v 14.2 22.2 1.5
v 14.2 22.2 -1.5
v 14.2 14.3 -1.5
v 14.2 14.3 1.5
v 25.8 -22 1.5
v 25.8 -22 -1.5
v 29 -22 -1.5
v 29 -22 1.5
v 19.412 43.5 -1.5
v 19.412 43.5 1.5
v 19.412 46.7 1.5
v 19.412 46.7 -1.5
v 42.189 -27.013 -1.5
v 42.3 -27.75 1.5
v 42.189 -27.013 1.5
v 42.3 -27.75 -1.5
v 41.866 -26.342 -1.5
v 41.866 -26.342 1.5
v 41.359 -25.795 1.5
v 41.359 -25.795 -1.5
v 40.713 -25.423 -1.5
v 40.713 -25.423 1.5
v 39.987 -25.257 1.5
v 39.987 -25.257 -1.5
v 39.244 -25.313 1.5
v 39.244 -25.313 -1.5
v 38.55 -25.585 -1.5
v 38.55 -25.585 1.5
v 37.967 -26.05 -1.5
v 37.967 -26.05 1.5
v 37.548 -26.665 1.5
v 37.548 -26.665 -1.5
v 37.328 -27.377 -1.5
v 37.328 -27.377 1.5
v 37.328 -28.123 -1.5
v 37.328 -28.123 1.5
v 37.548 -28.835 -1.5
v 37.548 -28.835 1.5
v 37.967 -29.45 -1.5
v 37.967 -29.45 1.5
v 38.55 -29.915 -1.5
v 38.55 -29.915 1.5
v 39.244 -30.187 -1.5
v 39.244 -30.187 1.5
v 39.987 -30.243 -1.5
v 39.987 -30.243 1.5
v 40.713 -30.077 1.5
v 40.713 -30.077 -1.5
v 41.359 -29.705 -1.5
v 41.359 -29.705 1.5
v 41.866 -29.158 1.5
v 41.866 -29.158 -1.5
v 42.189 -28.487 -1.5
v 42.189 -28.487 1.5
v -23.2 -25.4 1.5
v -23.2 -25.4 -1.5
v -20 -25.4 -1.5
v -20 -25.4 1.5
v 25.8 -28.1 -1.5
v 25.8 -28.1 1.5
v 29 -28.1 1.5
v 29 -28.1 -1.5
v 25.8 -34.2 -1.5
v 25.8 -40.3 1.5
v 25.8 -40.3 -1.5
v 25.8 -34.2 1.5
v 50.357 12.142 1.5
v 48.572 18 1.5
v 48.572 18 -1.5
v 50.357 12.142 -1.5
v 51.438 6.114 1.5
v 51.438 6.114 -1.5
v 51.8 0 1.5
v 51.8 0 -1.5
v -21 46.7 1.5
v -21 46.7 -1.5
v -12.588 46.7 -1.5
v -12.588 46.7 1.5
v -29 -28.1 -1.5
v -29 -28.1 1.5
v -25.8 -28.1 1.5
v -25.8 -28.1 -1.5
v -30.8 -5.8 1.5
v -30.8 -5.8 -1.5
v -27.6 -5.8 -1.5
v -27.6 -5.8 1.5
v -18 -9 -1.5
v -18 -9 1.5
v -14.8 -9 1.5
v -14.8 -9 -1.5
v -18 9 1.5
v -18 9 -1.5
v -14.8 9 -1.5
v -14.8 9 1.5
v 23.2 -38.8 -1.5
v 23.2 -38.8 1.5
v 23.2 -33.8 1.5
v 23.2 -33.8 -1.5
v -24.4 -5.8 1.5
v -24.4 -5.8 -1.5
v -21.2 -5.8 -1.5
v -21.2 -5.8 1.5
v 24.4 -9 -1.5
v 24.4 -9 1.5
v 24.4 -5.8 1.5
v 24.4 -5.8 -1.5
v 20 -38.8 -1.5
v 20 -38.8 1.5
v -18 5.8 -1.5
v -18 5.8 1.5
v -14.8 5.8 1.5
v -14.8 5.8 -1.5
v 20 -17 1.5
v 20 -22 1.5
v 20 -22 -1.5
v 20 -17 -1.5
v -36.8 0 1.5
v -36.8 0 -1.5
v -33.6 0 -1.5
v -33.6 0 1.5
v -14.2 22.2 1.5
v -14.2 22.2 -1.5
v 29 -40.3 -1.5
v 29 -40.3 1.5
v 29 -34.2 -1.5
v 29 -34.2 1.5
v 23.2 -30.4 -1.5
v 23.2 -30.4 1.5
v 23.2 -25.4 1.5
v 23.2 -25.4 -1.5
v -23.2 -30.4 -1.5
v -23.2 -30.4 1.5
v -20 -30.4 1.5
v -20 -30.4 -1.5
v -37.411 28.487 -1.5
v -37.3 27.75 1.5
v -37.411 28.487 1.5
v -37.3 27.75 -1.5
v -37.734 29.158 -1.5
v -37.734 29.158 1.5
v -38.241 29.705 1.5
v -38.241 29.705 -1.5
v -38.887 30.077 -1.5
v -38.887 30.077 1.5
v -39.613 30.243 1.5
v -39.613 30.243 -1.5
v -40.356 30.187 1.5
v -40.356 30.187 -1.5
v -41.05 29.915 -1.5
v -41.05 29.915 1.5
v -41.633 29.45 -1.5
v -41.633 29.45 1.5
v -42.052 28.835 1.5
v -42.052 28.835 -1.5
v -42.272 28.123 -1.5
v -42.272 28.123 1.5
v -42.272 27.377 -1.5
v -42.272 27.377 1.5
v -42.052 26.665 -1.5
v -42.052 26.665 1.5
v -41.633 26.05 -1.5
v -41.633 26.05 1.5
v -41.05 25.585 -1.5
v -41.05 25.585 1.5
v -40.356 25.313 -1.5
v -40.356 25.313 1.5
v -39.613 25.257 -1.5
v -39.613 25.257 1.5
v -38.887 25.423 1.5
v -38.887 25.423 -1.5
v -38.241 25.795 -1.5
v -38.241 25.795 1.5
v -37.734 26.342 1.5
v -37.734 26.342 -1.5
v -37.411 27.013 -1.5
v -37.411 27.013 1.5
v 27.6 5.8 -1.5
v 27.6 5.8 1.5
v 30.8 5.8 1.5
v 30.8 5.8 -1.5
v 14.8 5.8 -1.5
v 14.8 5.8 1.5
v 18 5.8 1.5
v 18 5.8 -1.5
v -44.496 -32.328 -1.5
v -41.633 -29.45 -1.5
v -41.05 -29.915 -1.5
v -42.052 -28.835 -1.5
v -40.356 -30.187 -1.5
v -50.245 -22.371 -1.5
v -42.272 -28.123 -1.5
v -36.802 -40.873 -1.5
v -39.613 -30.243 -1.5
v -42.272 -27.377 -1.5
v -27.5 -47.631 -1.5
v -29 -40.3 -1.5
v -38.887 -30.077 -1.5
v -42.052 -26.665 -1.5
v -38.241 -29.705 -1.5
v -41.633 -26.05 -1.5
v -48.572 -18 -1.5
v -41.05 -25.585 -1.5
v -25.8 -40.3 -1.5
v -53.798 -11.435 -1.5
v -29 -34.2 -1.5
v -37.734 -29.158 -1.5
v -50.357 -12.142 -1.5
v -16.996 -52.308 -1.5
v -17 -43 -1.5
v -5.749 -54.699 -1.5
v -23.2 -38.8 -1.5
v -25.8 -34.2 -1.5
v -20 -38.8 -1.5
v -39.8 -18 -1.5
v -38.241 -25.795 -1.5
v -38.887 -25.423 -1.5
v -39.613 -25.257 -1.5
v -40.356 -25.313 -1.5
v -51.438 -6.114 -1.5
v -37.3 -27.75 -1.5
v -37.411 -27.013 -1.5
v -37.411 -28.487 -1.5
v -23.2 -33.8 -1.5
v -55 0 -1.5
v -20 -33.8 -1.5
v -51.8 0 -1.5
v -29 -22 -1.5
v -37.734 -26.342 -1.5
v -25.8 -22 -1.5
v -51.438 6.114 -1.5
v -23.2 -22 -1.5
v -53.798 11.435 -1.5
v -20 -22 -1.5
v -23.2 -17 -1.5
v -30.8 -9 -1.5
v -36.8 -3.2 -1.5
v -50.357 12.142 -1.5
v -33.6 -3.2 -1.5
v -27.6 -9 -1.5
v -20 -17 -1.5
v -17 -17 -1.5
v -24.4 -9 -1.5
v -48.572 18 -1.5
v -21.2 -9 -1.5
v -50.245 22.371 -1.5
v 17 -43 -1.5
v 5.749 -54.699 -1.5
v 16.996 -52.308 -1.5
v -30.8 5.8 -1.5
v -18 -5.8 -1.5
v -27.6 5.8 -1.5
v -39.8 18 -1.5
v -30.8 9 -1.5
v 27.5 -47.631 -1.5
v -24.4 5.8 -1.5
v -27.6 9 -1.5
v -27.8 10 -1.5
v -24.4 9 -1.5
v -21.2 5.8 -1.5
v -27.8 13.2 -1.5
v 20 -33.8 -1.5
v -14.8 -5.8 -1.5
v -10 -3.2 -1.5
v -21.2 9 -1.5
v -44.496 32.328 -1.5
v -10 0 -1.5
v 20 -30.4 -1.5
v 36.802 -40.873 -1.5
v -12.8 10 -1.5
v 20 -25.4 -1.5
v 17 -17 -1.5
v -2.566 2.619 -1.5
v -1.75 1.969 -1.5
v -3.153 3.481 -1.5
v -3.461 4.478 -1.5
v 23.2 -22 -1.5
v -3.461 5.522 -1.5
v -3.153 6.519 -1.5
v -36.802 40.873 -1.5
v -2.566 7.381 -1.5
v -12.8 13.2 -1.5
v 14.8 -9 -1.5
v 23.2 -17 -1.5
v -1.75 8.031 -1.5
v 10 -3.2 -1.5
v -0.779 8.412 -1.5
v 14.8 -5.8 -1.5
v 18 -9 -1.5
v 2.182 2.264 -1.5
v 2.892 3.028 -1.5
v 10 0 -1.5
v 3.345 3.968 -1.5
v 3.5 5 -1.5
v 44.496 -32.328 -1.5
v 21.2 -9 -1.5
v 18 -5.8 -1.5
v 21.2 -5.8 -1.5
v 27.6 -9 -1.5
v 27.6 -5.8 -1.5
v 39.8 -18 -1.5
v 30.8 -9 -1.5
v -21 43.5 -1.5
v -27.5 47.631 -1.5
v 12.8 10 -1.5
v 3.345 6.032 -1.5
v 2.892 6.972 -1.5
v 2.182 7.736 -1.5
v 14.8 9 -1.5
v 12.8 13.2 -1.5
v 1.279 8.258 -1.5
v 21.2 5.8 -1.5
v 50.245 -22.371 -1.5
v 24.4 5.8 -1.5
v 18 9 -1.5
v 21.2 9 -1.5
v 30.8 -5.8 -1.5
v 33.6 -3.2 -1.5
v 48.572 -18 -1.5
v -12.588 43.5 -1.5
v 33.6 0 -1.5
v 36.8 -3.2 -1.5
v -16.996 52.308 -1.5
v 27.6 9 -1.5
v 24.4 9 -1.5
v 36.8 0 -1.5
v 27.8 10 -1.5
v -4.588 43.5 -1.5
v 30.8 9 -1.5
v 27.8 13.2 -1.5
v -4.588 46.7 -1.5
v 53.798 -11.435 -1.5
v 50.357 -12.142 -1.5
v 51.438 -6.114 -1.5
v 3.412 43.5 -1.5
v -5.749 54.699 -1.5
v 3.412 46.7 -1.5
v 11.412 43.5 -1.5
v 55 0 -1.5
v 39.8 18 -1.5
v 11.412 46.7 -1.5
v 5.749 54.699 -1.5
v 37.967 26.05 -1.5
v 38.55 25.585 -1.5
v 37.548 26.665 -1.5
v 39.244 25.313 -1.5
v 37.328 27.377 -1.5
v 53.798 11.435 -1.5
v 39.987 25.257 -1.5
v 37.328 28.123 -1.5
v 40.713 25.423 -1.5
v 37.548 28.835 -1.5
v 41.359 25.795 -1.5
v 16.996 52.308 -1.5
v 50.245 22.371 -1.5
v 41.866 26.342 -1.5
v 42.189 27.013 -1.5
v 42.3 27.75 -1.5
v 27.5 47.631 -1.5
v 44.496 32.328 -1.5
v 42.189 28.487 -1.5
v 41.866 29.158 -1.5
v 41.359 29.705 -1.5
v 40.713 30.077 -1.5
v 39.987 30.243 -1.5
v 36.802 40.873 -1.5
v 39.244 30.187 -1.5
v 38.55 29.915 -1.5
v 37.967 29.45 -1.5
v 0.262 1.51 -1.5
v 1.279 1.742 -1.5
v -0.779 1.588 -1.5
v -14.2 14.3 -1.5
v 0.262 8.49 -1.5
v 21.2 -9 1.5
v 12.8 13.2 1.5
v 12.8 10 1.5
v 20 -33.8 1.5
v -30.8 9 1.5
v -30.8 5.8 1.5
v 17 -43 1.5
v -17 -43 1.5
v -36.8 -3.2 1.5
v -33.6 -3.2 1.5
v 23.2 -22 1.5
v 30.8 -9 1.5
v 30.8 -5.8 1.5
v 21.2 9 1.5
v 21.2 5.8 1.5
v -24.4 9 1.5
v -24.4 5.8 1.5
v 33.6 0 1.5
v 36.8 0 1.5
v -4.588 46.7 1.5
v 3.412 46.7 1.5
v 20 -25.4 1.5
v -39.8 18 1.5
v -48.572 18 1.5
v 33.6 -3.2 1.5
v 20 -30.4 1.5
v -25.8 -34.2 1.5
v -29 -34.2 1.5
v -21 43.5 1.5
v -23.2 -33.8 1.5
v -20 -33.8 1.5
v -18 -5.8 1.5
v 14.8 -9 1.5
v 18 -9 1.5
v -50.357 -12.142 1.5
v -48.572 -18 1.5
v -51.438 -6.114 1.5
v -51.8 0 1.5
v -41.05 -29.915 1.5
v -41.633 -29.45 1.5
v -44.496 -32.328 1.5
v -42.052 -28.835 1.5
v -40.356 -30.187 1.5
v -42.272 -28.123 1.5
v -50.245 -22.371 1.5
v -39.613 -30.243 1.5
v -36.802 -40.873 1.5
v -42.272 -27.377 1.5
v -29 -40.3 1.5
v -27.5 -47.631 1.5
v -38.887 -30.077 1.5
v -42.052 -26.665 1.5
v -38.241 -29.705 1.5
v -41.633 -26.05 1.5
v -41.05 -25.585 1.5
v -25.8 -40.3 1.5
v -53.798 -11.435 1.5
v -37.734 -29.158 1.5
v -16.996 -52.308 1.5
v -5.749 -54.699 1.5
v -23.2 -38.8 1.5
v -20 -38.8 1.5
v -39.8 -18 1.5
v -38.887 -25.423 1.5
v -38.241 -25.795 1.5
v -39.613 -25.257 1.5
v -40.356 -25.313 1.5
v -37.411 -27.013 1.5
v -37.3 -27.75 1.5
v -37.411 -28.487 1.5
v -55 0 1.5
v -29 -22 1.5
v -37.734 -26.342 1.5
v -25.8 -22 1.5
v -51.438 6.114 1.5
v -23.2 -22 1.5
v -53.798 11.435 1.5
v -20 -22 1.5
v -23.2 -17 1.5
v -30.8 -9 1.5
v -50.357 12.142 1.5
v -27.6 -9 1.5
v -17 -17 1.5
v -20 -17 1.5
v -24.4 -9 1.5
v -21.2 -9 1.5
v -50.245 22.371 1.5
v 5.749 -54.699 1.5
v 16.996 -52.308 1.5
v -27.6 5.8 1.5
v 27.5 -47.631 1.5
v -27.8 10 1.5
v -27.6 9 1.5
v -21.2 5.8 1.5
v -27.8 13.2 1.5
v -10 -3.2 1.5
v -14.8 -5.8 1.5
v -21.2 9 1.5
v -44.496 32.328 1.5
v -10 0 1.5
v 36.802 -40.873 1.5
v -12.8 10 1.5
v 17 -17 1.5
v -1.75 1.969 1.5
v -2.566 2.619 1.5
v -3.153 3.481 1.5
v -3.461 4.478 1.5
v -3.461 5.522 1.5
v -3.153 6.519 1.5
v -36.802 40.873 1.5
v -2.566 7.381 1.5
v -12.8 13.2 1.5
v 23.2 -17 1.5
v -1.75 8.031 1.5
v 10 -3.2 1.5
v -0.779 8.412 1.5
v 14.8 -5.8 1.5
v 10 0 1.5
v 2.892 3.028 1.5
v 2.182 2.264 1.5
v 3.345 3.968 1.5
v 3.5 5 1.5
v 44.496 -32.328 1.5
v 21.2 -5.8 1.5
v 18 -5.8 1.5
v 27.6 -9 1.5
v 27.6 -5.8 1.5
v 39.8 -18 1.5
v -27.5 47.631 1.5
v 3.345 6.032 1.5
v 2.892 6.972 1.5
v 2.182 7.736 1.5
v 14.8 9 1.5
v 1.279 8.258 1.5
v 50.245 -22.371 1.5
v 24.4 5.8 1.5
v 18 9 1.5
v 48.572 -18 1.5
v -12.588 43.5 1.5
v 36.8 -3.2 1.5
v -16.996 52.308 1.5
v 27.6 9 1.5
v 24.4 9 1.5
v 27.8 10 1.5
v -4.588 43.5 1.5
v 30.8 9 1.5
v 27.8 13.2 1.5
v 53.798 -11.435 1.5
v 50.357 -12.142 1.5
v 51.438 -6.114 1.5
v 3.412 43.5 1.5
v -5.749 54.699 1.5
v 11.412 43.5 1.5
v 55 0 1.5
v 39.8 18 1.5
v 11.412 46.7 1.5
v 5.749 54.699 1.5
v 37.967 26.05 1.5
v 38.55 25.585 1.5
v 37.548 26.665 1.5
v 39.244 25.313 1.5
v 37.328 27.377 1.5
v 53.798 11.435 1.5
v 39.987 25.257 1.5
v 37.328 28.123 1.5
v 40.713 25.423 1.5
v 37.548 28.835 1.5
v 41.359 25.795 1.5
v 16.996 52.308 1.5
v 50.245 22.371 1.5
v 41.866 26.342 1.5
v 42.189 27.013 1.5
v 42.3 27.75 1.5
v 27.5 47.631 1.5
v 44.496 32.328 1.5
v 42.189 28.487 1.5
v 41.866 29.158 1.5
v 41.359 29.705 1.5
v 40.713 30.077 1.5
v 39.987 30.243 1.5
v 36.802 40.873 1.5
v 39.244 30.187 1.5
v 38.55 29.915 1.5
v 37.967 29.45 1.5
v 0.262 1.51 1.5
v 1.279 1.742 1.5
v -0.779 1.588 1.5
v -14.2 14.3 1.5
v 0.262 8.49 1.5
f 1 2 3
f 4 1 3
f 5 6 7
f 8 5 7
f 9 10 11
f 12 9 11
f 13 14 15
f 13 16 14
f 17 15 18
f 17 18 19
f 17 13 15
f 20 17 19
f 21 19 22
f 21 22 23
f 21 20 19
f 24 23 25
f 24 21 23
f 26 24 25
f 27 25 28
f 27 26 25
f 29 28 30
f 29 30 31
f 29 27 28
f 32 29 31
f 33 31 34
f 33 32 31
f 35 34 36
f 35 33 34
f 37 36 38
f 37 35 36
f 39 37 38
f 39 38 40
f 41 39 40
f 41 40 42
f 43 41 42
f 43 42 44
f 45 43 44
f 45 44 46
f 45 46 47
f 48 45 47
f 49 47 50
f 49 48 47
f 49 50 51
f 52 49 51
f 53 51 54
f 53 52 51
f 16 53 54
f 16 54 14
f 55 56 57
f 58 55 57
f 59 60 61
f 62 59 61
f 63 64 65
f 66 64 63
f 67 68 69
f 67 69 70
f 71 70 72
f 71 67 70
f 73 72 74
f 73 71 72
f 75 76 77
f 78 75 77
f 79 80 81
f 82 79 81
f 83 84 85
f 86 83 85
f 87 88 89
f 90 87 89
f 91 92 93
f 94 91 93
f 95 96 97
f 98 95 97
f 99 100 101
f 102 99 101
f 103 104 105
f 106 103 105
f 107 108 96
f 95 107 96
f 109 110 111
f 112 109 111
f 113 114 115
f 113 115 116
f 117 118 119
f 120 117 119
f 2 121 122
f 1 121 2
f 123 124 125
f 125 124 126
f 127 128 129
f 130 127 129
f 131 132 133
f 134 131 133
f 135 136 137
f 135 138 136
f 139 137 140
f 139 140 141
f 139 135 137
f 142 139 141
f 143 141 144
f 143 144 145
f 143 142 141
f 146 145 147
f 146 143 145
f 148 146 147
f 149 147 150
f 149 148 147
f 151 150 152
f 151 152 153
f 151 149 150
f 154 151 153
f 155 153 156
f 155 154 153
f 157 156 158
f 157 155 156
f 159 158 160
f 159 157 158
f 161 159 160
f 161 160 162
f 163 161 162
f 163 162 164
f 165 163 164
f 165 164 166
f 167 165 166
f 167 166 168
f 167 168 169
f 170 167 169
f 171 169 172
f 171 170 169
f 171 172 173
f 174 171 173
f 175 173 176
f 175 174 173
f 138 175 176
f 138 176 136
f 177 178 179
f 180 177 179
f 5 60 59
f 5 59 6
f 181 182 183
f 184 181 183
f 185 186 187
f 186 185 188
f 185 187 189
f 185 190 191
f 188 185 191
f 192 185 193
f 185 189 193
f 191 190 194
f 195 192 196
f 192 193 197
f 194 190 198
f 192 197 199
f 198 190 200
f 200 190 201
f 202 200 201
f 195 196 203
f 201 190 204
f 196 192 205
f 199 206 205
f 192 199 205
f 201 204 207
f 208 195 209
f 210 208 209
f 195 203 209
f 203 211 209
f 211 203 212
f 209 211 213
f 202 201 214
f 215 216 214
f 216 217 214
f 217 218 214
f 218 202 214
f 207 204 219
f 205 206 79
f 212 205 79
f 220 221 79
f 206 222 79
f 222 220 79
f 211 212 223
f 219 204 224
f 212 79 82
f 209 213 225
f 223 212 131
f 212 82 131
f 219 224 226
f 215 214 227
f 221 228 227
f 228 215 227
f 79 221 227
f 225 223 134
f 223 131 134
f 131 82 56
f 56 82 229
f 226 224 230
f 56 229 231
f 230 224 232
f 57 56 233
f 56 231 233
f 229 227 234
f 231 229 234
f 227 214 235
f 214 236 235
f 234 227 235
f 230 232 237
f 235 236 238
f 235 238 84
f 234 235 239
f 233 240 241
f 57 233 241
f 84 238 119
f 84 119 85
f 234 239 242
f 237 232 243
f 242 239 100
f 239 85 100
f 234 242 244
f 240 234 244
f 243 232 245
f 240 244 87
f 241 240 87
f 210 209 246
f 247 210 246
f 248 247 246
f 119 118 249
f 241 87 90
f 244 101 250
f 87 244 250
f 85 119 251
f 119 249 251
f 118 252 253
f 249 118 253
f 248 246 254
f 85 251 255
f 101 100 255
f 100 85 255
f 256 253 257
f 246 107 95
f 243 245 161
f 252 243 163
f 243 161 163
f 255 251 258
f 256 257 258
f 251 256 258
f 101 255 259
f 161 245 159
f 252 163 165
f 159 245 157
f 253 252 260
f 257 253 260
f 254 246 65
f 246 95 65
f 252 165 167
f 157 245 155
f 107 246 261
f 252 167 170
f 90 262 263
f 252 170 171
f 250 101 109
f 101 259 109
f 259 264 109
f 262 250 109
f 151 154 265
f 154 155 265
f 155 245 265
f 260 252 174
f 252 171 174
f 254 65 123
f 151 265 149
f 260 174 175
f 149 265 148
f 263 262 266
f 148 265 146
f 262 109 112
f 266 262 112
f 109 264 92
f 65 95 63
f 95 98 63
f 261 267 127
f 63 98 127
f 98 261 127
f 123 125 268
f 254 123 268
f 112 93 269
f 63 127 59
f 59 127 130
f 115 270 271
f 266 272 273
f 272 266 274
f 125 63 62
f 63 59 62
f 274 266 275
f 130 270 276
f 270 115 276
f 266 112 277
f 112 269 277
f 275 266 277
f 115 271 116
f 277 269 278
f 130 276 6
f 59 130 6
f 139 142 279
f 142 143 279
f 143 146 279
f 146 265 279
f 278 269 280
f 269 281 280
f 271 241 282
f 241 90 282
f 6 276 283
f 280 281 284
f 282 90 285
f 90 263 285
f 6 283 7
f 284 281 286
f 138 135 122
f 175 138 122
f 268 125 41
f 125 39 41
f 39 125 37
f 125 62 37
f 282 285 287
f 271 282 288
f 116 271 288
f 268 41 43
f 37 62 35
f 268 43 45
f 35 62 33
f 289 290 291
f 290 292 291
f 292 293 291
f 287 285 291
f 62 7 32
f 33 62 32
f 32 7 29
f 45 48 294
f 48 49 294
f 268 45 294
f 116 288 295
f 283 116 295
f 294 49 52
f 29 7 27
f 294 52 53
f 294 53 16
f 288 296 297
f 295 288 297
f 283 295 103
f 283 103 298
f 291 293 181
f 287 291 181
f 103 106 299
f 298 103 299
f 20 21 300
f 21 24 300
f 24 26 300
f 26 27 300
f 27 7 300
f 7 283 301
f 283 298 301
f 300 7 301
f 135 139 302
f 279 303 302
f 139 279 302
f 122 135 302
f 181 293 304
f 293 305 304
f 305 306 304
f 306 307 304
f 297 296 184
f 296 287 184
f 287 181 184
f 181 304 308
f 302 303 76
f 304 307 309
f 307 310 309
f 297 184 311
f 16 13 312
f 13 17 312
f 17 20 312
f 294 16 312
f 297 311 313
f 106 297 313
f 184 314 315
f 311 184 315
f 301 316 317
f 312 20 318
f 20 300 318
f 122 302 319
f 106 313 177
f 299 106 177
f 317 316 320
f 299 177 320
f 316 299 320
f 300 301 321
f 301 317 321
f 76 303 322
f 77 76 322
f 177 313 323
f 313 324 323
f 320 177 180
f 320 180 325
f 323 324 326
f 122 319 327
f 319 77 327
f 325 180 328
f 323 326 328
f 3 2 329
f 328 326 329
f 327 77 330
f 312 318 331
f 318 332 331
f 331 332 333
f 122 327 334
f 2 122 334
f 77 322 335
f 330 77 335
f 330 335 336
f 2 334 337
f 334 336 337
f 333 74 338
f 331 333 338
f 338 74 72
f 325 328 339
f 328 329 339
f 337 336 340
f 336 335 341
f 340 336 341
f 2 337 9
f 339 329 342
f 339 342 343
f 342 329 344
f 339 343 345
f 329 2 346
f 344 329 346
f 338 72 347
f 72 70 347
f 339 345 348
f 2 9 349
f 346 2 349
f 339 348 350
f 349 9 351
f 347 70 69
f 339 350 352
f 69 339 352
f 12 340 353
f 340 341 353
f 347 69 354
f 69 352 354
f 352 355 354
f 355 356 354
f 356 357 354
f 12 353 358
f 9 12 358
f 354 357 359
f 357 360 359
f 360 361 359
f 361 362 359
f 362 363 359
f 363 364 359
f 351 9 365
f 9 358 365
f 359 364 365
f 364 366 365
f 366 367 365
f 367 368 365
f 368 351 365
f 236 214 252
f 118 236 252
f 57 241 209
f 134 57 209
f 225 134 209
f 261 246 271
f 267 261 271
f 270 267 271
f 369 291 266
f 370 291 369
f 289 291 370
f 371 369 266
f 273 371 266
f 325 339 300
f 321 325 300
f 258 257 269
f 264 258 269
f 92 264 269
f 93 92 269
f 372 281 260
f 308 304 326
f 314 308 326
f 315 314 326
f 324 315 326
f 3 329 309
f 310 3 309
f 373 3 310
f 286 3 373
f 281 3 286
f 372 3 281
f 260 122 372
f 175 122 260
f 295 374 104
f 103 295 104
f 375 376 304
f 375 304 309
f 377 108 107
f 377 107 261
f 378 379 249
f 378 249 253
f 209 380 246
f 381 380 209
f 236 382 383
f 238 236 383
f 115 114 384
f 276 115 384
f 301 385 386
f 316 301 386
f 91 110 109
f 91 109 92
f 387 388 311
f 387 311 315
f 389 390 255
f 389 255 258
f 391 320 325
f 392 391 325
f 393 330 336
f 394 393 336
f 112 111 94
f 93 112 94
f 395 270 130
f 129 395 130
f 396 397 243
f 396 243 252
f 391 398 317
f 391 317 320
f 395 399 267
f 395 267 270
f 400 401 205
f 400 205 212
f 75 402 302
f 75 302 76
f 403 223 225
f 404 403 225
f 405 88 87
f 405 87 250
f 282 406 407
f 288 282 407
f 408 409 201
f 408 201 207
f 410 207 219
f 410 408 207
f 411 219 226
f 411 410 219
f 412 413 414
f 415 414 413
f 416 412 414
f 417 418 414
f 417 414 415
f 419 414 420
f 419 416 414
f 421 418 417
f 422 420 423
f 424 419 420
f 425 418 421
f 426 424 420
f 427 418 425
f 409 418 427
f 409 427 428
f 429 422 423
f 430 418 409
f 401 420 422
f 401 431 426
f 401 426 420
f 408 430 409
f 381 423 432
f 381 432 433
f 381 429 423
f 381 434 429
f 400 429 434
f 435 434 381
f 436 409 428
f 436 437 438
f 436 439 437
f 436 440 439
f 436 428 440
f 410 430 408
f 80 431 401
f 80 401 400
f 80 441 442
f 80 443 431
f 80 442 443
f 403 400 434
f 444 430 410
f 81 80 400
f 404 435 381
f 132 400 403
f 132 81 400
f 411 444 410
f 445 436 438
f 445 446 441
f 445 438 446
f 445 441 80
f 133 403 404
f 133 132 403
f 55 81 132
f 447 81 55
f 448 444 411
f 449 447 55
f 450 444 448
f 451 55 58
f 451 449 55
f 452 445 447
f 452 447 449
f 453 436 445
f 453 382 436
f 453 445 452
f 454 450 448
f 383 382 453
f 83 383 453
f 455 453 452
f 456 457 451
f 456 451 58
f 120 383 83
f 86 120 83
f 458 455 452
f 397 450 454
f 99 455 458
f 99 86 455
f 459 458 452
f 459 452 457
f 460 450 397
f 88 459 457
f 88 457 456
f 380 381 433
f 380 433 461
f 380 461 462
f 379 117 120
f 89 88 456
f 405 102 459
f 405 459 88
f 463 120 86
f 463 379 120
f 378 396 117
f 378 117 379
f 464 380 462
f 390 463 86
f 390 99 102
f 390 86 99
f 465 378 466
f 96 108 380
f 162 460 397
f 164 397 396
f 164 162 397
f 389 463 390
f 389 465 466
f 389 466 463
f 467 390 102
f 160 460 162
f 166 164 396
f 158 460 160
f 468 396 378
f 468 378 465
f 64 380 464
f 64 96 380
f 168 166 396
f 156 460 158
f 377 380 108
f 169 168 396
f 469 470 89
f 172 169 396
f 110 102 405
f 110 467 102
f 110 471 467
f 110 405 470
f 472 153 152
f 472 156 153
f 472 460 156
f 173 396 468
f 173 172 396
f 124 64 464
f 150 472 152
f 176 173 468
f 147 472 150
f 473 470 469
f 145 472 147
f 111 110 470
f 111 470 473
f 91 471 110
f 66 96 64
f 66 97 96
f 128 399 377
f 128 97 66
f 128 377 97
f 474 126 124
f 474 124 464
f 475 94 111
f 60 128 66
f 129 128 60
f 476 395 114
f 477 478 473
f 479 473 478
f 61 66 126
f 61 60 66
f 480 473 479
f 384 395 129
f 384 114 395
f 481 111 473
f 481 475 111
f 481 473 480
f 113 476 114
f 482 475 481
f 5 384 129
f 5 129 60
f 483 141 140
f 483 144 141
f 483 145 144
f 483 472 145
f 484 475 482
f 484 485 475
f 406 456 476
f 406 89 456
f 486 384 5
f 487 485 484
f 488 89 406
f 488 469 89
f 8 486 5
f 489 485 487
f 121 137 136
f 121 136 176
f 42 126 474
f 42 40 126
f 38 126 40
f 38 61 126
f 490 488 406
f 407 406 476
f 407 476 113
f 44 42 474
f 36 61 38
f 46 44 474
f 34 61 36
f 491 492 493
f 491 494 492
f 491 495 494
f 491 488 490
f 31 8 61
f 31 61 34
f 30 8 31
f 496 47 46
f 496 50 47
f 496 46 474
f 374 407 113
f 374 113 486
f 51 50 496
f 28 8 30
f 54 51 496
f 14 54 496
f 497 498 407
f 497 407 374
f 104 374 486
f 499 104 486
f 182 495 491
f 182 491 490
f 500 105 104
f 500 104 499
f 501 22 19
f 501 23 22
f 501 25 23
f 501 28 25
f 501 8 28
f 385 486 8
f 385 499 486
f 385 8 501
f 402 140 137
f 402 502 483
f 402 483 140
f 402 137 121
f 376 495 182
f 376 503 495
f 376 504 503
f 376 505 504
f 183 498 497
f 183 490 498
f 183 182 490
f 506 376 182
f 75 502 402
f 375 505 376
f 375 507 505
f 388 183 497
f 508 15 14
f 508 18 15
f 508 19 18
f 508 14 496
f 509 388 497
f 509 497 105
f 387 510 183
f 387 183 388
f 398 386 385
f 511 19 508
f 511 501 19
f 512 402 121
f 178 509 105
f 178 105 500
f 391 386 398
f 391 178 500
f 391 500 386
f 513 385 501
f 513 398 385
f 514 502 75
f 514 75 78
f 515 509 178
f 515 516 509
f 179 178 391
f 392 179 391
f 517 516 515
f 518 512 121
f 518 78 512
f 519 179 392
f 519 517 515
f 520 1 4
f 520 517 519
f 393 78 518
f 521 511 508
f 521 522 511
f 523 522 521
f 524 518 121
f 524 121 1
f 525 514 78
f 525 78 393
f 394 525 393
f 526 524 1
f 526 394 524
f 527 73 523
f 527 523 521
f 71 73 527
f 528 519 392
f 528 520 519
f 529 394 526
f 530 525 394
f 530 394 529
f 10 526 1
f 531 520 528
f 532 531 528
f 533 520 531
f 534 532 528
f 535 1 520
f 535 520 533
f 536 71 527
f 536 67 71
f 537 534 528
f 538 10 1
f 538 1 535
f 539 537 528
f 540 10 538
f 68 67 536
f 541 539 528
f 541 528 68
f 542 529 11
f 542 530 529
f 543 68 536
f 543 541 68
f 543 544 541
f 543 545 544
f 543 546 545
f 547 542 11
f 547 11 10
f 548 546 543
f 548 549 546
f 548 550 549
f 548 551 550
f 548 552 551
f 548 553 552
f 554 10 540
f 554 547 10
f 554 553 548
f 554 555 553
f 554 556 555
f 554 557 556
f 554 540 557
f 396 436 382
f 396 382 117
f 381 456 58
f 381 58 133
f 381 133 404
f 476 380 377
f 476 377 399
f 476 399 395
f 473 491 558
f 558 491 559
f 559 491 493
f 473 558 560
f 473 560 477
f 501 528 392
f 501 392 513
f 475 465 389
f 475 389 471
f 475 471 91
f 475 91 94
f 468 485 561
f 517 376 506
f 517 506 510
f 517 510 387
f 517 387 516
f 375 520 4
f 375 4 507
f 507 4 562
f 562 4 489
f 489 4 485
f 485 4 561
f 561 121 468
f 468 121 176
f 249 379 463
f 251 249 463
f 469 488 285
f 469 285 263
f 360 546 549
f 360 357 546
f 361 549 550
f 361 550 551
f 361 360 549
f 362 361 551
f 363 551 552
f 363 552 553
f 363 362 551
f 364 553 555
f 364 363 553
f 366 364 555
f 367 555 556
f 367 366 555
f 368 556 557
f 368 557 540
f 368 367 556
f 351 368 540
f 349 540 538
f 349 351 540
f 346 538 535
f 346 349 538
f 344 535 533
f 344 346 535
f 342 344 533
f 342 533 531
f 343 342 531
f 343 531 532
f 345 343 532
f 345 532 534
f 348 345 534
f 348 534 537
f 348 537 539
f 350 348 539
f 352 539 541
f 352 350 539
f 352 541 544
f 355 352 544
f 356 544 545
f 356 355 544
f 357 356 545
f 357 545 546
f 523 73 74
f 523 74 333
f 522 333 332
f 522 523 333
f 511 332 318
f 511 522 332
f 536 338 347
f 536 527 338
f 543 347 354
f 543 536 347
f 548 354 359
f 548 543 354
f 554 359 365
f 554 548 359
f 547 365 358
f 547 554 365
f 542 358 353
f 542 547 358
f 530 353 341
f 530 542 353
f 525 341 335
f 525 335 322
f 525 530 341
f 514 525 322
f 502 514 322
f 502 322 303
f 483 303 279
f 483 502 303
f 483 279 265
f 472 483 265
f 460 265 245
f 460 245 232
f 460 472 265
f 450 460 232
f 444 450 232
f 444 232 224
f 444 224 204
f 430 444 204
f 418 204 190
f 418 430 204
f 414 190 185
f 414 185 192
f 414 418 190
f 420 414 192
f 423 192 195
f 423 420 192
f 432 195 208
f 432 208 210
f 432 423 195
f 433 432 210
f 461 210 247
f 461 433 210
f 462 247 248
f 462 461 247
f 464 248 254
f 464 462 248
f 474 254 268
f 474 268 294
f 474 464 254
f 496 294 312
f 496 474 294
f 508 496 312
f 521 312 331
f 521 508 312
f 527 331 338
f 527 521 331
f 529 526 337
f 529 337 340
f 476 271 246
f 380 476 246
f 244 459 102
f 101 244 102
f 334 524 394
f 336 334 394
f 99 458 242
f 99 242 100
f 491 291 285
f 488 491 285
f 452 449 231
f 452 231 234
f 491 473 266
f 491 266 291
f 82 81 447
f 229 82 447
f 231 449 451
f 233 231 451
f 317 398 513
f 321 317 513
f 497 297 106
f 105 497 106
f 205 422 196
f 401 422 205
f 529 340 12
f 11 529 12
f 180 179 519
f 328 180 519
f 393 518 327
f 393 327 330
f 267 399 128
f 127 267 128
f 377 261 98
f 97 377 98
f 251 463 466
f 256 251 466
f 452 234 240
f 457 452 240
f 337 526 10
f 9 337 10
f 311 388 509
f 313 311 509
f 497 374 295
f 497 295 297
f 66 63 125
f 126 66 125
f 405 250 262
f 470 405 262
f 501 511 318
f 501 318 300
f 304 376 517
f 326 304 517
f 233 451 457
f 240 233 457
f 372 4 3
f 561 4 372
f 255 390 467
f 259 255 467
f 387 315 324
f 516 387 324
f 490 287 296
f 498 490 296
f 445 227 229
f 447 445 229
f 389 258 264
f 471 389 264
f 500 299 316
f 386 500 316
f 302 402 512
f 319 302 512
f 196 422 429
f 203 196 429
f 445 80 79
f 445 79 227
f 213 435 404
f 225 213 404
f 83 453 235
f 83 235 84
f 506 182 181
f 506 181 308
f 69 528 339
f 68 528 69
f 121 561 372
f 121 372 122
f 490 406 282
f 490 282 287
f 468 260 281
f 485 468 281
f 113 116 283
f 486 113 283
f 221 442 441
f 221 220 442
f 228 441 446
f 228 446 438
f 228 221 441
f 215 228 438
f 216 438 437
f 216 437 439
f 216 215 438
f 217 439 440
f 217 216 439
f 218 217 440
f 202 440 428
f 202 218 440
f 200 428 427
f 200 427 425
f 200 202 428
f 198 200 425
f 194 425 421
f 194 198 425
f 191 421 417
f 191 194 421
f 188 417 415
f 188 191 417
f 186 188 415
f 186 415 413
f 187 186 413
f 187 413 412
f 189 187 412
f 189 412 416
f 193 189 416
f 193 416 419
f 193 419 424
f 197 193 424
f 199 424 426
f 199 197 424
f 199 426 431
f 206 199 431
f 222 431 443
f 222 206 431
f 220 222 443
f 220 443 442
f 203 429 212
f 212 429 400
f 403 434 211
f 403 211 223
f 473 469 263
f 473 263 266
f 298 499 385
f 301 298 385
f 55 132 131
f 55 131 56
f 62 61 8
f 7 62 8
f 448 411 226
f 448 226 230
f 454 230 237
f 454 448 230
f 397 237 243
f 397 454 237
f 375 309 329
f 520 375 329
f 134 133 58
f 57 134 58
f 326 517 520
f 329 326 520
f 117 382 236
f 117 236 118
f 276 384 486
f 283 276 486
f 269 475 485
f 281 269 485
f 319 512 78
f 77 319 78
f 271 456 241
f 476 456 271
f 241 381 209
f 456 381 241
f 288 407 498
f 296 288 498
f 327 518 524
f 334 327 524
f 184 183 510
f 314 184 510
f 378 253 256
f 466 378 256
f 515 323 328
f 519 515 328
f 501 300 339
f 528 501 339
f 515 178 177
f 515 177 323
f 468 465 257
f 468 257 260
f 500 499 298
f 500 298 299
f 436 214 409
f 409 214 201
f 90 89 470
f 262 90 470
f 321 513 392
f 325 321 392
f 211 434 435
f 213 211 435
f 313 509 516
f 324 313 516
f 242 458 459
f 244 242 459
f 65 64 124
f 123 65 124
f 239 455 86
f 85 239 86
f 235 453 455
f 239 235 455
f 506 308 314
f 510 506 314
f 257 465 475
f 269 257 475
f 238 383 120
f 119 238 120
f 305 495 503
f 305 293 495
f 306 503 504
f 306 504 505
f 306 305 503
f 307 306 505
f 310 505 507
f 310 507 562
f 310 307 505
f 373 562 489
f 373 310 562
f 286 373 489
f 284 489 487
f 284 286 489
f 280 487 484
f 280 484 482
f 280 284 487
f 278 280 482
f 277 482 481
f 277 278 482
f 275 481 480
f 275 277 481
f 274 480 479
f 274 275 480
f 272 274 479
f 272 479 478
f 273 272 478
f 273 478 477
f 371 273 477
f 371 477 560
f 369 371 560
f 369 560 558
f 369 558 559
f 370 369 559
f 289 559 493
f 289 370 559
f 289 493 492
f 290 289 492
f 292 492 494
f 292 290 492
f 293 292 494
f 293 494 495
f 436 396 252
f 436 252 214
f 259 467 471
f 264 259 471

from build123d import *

# Parameters (mm, degrees)
F0_R     = 55
F0_R_2   = 2.5
F0_W     = 3.2
F0_H     = 6.1
F0_H_2   = 5
F0_H_3   = 3.2
F0_W_2   = 15
F0_W_3   = 8.41237
F0_W_4   = 8
F0_R_3   = 3.5
F1_DEPTH = 1.5


with BuildPart() as f1:
    # F0 (on Top) → F1 (new body, symmetric)
    with BuildSketch(Plane.XY):
        Circle(F0_R)
        with Locations((-39.8, -27.75)):
            Circle(F0_R_2, mode=Mode.SUBTRACT)
        with Locations((-27.4, -37.25)):
            Rectangle(F0_W, F0_H, mode=Mode.SUBTRACT)
        with Locations((-21.6, -36.3)):
            Rectangle(F0_W, F0_H_2, mode=Mode.SUBTRACT)
        with Locations((-21.6, -27.9)):
            Rectangle(F0_W, F0_H_2, mode=Mode.SUBTRACT)
        with Locations((-29.2, -7.4)):
            Rectangle(F0_W, F0_H_3, mode=Mode.SUBTRACT)
        with Locations((-35.2, -1.6)):
            Rectangle(F0_W, F0_H_3, mode=Mode.SUBTRACT)
        with Locations((-27.4, -25.05)):
            Rectangle(F0_W, F0_H, mode=Mode.SUBTRACT)
        with Locations((-21.6, -19.5)):
            Rectangle(F0_W, F0_H_2, mode=Mode.SUBTRACT)
        with Locations((-22.8, -7.4)):
            Rectangle(F0_W, F0_H_3, mode=Mode.SUBTRACT)
        with Locations((-16.4, -7.4)):
            Rectangle(F0_W, F0_H_3, mode=Mode.SUBTRACT)
        Polygon((-17, -17), (0, -17), (17, -17), (17, -43), (-17, -43), align=None, mode=Mode.SUBTRACT)
        with Locations((21.6, -36.3)):
            Rectangle(F0_W, F0_H_2, mode=Mode.SUBTRACT)
        with Locations((27.4, -37.25)):
            Rectangle(F0_W, F0_H, mode=Mode.SUBTRACT)
        with Locations((21.6, -27.9)):
            Rectangle(F0_W, F0_H_2, mode=Mode.SUBTRACT)
        with Locations((39.8, -27.75)):
            Circle(F0_R_2, mode=Mode.SUBTRACT)
        with Locations((27.4, -25.05)):
            Rectangle(F0_W, F0_H, mode=Mode.SUBTRACT)
        with Locations((21.6, -19.5)):
            Rectangle(F0_W, F0_H_2, mode=Mode.SUBTRACT)
        Polygon((-10, 0), (0, 0), (10, 0), (10, -3.2), (-10, -3.2), align=None, mode=Mode.SUBTRACT)
        with Locations((16.4, -7.4)):
            Rectangle(F0_W, F0_H_3, mode=Mode.SUBTRACT)
        with Locations((22.8, -7.4)):
            Rectangle(F0_W, F0_H_3, mode=Mode.SUBTRACT)
        with Locations((29.2, -7.4)):
            Rectangle(F0_W, F0_H_3, mode=Mode.SUBTRACT)
        with Locations((35.2, -1.6)):
            Rectangle(F0_W, F0_H_3, mode=Mode.SUBTRACT)
        with BuildLine():
            Line((-44.8, 18), (-39.8, 18))
            Line((-39.8, 18), (-39.8, -18))
            Line((-39.8, -18), (-44.8, -18))
            Line((-44.8, -18), (-48.572008, -18))
            ThreePointArc((-48.572008, -18), (-50.986616, -9.143576), (-51.8, 0))
            ThreePointArc((-51.8, 0), (-50.986616, 9.143576), (-48.572008, 18))
            Line((-48.572008, 18), (-44.8, 18))
        make_face(mode=Mode.SUBTRACT)
        with Locations((-29.2, 7.4)):
            Rectangle(F0_W, F0_H_3, mode=Mode.SUBTRACT)
        with Locations((-22.8, 7.4)):
            Rectangle(F0_W, F0_H_3, mode=Mode.SUBTRACT)
        with Locations((-16.4, 7.4)):
            Rectangle(F0_W, F0_H_3, mode=Mode.SUBTRACT)
        with Locations((-20.3, 11.6)):
            Rectangle(F0_W_2, F0_H_3, mode=Mode.SUBTRACT)
        with Locations((-39.8, 27.75)):
            Circle(F0_R_2, mode=Mode.SUBTRACT)
        with Locations((-16.793815, 45.1)):
            Rectangle(F0_W_3, F0_H_3, mode=Mode.SUBTRACT)
        with Locations((-0.58763, 45.1)):
            Rectangle(F0_W_4, F0_H_3, mode=Mode.SUBTRACT)
        with Locations((0, 5)):
            Circle(F0_R_3, mode=Mode.SUBTRACT)
        with Locations((16.4, 7.4)):
            Rectangle(F0_W, F0_H_3, mode=Mode.SUBTRACT)
        with Locations((20.3, 11.6)):
            Rectangle(F0_W_2, F0_H_3, mode=Mode.SUBTRACT)
        with Locations((22.8, 7.4)):
            Rectangle(F0_W, F0_H_3, mode=Mode.SUBTRACT)
        Polygon((-14.2, 22.2), (14.2, 22.2), (14.2, 15.2), (14.2, 14.3), (-14.2, 14.3), (-14.2, 15.2), align=None, mode=Mode.SUBTRACT)
        with Locations((29.2, 7.4)):
            Rectangle(F0_W, F0_H_3, mode=Mode.SUBTRACT)
        with BuildLine():
            Line((48.572008, -18), (44.8, -18))
            Line((44.8, -18), (39.8, -18))
            Line((39.8, -18), (39.8, 18))
            Line((39.8, 18), (44.8, 18))
            Line((44.8, 18), (48.572008, 18))
            ThreePointArc((48.572008, 18), (50.986616, 9.143576), (51.8, 0))
            ThreePointArc((51.8, 0), (50.986616, -9.143576), (48.572008, -18))
        make_face(mode=Mode.SUBTRACT)
        with Locations((15.41237, 45.1)):
            Rectangle(F0_W_4, F0_H_3, mode=Mode.SUBTRACT)
        with Locations((39.8, 27.75)):
            Circle(F0_R_2, mode=Mode.SUBTRACT)
    extrude(amount=F1_DEPTH, both=True)


solid = f1.part
